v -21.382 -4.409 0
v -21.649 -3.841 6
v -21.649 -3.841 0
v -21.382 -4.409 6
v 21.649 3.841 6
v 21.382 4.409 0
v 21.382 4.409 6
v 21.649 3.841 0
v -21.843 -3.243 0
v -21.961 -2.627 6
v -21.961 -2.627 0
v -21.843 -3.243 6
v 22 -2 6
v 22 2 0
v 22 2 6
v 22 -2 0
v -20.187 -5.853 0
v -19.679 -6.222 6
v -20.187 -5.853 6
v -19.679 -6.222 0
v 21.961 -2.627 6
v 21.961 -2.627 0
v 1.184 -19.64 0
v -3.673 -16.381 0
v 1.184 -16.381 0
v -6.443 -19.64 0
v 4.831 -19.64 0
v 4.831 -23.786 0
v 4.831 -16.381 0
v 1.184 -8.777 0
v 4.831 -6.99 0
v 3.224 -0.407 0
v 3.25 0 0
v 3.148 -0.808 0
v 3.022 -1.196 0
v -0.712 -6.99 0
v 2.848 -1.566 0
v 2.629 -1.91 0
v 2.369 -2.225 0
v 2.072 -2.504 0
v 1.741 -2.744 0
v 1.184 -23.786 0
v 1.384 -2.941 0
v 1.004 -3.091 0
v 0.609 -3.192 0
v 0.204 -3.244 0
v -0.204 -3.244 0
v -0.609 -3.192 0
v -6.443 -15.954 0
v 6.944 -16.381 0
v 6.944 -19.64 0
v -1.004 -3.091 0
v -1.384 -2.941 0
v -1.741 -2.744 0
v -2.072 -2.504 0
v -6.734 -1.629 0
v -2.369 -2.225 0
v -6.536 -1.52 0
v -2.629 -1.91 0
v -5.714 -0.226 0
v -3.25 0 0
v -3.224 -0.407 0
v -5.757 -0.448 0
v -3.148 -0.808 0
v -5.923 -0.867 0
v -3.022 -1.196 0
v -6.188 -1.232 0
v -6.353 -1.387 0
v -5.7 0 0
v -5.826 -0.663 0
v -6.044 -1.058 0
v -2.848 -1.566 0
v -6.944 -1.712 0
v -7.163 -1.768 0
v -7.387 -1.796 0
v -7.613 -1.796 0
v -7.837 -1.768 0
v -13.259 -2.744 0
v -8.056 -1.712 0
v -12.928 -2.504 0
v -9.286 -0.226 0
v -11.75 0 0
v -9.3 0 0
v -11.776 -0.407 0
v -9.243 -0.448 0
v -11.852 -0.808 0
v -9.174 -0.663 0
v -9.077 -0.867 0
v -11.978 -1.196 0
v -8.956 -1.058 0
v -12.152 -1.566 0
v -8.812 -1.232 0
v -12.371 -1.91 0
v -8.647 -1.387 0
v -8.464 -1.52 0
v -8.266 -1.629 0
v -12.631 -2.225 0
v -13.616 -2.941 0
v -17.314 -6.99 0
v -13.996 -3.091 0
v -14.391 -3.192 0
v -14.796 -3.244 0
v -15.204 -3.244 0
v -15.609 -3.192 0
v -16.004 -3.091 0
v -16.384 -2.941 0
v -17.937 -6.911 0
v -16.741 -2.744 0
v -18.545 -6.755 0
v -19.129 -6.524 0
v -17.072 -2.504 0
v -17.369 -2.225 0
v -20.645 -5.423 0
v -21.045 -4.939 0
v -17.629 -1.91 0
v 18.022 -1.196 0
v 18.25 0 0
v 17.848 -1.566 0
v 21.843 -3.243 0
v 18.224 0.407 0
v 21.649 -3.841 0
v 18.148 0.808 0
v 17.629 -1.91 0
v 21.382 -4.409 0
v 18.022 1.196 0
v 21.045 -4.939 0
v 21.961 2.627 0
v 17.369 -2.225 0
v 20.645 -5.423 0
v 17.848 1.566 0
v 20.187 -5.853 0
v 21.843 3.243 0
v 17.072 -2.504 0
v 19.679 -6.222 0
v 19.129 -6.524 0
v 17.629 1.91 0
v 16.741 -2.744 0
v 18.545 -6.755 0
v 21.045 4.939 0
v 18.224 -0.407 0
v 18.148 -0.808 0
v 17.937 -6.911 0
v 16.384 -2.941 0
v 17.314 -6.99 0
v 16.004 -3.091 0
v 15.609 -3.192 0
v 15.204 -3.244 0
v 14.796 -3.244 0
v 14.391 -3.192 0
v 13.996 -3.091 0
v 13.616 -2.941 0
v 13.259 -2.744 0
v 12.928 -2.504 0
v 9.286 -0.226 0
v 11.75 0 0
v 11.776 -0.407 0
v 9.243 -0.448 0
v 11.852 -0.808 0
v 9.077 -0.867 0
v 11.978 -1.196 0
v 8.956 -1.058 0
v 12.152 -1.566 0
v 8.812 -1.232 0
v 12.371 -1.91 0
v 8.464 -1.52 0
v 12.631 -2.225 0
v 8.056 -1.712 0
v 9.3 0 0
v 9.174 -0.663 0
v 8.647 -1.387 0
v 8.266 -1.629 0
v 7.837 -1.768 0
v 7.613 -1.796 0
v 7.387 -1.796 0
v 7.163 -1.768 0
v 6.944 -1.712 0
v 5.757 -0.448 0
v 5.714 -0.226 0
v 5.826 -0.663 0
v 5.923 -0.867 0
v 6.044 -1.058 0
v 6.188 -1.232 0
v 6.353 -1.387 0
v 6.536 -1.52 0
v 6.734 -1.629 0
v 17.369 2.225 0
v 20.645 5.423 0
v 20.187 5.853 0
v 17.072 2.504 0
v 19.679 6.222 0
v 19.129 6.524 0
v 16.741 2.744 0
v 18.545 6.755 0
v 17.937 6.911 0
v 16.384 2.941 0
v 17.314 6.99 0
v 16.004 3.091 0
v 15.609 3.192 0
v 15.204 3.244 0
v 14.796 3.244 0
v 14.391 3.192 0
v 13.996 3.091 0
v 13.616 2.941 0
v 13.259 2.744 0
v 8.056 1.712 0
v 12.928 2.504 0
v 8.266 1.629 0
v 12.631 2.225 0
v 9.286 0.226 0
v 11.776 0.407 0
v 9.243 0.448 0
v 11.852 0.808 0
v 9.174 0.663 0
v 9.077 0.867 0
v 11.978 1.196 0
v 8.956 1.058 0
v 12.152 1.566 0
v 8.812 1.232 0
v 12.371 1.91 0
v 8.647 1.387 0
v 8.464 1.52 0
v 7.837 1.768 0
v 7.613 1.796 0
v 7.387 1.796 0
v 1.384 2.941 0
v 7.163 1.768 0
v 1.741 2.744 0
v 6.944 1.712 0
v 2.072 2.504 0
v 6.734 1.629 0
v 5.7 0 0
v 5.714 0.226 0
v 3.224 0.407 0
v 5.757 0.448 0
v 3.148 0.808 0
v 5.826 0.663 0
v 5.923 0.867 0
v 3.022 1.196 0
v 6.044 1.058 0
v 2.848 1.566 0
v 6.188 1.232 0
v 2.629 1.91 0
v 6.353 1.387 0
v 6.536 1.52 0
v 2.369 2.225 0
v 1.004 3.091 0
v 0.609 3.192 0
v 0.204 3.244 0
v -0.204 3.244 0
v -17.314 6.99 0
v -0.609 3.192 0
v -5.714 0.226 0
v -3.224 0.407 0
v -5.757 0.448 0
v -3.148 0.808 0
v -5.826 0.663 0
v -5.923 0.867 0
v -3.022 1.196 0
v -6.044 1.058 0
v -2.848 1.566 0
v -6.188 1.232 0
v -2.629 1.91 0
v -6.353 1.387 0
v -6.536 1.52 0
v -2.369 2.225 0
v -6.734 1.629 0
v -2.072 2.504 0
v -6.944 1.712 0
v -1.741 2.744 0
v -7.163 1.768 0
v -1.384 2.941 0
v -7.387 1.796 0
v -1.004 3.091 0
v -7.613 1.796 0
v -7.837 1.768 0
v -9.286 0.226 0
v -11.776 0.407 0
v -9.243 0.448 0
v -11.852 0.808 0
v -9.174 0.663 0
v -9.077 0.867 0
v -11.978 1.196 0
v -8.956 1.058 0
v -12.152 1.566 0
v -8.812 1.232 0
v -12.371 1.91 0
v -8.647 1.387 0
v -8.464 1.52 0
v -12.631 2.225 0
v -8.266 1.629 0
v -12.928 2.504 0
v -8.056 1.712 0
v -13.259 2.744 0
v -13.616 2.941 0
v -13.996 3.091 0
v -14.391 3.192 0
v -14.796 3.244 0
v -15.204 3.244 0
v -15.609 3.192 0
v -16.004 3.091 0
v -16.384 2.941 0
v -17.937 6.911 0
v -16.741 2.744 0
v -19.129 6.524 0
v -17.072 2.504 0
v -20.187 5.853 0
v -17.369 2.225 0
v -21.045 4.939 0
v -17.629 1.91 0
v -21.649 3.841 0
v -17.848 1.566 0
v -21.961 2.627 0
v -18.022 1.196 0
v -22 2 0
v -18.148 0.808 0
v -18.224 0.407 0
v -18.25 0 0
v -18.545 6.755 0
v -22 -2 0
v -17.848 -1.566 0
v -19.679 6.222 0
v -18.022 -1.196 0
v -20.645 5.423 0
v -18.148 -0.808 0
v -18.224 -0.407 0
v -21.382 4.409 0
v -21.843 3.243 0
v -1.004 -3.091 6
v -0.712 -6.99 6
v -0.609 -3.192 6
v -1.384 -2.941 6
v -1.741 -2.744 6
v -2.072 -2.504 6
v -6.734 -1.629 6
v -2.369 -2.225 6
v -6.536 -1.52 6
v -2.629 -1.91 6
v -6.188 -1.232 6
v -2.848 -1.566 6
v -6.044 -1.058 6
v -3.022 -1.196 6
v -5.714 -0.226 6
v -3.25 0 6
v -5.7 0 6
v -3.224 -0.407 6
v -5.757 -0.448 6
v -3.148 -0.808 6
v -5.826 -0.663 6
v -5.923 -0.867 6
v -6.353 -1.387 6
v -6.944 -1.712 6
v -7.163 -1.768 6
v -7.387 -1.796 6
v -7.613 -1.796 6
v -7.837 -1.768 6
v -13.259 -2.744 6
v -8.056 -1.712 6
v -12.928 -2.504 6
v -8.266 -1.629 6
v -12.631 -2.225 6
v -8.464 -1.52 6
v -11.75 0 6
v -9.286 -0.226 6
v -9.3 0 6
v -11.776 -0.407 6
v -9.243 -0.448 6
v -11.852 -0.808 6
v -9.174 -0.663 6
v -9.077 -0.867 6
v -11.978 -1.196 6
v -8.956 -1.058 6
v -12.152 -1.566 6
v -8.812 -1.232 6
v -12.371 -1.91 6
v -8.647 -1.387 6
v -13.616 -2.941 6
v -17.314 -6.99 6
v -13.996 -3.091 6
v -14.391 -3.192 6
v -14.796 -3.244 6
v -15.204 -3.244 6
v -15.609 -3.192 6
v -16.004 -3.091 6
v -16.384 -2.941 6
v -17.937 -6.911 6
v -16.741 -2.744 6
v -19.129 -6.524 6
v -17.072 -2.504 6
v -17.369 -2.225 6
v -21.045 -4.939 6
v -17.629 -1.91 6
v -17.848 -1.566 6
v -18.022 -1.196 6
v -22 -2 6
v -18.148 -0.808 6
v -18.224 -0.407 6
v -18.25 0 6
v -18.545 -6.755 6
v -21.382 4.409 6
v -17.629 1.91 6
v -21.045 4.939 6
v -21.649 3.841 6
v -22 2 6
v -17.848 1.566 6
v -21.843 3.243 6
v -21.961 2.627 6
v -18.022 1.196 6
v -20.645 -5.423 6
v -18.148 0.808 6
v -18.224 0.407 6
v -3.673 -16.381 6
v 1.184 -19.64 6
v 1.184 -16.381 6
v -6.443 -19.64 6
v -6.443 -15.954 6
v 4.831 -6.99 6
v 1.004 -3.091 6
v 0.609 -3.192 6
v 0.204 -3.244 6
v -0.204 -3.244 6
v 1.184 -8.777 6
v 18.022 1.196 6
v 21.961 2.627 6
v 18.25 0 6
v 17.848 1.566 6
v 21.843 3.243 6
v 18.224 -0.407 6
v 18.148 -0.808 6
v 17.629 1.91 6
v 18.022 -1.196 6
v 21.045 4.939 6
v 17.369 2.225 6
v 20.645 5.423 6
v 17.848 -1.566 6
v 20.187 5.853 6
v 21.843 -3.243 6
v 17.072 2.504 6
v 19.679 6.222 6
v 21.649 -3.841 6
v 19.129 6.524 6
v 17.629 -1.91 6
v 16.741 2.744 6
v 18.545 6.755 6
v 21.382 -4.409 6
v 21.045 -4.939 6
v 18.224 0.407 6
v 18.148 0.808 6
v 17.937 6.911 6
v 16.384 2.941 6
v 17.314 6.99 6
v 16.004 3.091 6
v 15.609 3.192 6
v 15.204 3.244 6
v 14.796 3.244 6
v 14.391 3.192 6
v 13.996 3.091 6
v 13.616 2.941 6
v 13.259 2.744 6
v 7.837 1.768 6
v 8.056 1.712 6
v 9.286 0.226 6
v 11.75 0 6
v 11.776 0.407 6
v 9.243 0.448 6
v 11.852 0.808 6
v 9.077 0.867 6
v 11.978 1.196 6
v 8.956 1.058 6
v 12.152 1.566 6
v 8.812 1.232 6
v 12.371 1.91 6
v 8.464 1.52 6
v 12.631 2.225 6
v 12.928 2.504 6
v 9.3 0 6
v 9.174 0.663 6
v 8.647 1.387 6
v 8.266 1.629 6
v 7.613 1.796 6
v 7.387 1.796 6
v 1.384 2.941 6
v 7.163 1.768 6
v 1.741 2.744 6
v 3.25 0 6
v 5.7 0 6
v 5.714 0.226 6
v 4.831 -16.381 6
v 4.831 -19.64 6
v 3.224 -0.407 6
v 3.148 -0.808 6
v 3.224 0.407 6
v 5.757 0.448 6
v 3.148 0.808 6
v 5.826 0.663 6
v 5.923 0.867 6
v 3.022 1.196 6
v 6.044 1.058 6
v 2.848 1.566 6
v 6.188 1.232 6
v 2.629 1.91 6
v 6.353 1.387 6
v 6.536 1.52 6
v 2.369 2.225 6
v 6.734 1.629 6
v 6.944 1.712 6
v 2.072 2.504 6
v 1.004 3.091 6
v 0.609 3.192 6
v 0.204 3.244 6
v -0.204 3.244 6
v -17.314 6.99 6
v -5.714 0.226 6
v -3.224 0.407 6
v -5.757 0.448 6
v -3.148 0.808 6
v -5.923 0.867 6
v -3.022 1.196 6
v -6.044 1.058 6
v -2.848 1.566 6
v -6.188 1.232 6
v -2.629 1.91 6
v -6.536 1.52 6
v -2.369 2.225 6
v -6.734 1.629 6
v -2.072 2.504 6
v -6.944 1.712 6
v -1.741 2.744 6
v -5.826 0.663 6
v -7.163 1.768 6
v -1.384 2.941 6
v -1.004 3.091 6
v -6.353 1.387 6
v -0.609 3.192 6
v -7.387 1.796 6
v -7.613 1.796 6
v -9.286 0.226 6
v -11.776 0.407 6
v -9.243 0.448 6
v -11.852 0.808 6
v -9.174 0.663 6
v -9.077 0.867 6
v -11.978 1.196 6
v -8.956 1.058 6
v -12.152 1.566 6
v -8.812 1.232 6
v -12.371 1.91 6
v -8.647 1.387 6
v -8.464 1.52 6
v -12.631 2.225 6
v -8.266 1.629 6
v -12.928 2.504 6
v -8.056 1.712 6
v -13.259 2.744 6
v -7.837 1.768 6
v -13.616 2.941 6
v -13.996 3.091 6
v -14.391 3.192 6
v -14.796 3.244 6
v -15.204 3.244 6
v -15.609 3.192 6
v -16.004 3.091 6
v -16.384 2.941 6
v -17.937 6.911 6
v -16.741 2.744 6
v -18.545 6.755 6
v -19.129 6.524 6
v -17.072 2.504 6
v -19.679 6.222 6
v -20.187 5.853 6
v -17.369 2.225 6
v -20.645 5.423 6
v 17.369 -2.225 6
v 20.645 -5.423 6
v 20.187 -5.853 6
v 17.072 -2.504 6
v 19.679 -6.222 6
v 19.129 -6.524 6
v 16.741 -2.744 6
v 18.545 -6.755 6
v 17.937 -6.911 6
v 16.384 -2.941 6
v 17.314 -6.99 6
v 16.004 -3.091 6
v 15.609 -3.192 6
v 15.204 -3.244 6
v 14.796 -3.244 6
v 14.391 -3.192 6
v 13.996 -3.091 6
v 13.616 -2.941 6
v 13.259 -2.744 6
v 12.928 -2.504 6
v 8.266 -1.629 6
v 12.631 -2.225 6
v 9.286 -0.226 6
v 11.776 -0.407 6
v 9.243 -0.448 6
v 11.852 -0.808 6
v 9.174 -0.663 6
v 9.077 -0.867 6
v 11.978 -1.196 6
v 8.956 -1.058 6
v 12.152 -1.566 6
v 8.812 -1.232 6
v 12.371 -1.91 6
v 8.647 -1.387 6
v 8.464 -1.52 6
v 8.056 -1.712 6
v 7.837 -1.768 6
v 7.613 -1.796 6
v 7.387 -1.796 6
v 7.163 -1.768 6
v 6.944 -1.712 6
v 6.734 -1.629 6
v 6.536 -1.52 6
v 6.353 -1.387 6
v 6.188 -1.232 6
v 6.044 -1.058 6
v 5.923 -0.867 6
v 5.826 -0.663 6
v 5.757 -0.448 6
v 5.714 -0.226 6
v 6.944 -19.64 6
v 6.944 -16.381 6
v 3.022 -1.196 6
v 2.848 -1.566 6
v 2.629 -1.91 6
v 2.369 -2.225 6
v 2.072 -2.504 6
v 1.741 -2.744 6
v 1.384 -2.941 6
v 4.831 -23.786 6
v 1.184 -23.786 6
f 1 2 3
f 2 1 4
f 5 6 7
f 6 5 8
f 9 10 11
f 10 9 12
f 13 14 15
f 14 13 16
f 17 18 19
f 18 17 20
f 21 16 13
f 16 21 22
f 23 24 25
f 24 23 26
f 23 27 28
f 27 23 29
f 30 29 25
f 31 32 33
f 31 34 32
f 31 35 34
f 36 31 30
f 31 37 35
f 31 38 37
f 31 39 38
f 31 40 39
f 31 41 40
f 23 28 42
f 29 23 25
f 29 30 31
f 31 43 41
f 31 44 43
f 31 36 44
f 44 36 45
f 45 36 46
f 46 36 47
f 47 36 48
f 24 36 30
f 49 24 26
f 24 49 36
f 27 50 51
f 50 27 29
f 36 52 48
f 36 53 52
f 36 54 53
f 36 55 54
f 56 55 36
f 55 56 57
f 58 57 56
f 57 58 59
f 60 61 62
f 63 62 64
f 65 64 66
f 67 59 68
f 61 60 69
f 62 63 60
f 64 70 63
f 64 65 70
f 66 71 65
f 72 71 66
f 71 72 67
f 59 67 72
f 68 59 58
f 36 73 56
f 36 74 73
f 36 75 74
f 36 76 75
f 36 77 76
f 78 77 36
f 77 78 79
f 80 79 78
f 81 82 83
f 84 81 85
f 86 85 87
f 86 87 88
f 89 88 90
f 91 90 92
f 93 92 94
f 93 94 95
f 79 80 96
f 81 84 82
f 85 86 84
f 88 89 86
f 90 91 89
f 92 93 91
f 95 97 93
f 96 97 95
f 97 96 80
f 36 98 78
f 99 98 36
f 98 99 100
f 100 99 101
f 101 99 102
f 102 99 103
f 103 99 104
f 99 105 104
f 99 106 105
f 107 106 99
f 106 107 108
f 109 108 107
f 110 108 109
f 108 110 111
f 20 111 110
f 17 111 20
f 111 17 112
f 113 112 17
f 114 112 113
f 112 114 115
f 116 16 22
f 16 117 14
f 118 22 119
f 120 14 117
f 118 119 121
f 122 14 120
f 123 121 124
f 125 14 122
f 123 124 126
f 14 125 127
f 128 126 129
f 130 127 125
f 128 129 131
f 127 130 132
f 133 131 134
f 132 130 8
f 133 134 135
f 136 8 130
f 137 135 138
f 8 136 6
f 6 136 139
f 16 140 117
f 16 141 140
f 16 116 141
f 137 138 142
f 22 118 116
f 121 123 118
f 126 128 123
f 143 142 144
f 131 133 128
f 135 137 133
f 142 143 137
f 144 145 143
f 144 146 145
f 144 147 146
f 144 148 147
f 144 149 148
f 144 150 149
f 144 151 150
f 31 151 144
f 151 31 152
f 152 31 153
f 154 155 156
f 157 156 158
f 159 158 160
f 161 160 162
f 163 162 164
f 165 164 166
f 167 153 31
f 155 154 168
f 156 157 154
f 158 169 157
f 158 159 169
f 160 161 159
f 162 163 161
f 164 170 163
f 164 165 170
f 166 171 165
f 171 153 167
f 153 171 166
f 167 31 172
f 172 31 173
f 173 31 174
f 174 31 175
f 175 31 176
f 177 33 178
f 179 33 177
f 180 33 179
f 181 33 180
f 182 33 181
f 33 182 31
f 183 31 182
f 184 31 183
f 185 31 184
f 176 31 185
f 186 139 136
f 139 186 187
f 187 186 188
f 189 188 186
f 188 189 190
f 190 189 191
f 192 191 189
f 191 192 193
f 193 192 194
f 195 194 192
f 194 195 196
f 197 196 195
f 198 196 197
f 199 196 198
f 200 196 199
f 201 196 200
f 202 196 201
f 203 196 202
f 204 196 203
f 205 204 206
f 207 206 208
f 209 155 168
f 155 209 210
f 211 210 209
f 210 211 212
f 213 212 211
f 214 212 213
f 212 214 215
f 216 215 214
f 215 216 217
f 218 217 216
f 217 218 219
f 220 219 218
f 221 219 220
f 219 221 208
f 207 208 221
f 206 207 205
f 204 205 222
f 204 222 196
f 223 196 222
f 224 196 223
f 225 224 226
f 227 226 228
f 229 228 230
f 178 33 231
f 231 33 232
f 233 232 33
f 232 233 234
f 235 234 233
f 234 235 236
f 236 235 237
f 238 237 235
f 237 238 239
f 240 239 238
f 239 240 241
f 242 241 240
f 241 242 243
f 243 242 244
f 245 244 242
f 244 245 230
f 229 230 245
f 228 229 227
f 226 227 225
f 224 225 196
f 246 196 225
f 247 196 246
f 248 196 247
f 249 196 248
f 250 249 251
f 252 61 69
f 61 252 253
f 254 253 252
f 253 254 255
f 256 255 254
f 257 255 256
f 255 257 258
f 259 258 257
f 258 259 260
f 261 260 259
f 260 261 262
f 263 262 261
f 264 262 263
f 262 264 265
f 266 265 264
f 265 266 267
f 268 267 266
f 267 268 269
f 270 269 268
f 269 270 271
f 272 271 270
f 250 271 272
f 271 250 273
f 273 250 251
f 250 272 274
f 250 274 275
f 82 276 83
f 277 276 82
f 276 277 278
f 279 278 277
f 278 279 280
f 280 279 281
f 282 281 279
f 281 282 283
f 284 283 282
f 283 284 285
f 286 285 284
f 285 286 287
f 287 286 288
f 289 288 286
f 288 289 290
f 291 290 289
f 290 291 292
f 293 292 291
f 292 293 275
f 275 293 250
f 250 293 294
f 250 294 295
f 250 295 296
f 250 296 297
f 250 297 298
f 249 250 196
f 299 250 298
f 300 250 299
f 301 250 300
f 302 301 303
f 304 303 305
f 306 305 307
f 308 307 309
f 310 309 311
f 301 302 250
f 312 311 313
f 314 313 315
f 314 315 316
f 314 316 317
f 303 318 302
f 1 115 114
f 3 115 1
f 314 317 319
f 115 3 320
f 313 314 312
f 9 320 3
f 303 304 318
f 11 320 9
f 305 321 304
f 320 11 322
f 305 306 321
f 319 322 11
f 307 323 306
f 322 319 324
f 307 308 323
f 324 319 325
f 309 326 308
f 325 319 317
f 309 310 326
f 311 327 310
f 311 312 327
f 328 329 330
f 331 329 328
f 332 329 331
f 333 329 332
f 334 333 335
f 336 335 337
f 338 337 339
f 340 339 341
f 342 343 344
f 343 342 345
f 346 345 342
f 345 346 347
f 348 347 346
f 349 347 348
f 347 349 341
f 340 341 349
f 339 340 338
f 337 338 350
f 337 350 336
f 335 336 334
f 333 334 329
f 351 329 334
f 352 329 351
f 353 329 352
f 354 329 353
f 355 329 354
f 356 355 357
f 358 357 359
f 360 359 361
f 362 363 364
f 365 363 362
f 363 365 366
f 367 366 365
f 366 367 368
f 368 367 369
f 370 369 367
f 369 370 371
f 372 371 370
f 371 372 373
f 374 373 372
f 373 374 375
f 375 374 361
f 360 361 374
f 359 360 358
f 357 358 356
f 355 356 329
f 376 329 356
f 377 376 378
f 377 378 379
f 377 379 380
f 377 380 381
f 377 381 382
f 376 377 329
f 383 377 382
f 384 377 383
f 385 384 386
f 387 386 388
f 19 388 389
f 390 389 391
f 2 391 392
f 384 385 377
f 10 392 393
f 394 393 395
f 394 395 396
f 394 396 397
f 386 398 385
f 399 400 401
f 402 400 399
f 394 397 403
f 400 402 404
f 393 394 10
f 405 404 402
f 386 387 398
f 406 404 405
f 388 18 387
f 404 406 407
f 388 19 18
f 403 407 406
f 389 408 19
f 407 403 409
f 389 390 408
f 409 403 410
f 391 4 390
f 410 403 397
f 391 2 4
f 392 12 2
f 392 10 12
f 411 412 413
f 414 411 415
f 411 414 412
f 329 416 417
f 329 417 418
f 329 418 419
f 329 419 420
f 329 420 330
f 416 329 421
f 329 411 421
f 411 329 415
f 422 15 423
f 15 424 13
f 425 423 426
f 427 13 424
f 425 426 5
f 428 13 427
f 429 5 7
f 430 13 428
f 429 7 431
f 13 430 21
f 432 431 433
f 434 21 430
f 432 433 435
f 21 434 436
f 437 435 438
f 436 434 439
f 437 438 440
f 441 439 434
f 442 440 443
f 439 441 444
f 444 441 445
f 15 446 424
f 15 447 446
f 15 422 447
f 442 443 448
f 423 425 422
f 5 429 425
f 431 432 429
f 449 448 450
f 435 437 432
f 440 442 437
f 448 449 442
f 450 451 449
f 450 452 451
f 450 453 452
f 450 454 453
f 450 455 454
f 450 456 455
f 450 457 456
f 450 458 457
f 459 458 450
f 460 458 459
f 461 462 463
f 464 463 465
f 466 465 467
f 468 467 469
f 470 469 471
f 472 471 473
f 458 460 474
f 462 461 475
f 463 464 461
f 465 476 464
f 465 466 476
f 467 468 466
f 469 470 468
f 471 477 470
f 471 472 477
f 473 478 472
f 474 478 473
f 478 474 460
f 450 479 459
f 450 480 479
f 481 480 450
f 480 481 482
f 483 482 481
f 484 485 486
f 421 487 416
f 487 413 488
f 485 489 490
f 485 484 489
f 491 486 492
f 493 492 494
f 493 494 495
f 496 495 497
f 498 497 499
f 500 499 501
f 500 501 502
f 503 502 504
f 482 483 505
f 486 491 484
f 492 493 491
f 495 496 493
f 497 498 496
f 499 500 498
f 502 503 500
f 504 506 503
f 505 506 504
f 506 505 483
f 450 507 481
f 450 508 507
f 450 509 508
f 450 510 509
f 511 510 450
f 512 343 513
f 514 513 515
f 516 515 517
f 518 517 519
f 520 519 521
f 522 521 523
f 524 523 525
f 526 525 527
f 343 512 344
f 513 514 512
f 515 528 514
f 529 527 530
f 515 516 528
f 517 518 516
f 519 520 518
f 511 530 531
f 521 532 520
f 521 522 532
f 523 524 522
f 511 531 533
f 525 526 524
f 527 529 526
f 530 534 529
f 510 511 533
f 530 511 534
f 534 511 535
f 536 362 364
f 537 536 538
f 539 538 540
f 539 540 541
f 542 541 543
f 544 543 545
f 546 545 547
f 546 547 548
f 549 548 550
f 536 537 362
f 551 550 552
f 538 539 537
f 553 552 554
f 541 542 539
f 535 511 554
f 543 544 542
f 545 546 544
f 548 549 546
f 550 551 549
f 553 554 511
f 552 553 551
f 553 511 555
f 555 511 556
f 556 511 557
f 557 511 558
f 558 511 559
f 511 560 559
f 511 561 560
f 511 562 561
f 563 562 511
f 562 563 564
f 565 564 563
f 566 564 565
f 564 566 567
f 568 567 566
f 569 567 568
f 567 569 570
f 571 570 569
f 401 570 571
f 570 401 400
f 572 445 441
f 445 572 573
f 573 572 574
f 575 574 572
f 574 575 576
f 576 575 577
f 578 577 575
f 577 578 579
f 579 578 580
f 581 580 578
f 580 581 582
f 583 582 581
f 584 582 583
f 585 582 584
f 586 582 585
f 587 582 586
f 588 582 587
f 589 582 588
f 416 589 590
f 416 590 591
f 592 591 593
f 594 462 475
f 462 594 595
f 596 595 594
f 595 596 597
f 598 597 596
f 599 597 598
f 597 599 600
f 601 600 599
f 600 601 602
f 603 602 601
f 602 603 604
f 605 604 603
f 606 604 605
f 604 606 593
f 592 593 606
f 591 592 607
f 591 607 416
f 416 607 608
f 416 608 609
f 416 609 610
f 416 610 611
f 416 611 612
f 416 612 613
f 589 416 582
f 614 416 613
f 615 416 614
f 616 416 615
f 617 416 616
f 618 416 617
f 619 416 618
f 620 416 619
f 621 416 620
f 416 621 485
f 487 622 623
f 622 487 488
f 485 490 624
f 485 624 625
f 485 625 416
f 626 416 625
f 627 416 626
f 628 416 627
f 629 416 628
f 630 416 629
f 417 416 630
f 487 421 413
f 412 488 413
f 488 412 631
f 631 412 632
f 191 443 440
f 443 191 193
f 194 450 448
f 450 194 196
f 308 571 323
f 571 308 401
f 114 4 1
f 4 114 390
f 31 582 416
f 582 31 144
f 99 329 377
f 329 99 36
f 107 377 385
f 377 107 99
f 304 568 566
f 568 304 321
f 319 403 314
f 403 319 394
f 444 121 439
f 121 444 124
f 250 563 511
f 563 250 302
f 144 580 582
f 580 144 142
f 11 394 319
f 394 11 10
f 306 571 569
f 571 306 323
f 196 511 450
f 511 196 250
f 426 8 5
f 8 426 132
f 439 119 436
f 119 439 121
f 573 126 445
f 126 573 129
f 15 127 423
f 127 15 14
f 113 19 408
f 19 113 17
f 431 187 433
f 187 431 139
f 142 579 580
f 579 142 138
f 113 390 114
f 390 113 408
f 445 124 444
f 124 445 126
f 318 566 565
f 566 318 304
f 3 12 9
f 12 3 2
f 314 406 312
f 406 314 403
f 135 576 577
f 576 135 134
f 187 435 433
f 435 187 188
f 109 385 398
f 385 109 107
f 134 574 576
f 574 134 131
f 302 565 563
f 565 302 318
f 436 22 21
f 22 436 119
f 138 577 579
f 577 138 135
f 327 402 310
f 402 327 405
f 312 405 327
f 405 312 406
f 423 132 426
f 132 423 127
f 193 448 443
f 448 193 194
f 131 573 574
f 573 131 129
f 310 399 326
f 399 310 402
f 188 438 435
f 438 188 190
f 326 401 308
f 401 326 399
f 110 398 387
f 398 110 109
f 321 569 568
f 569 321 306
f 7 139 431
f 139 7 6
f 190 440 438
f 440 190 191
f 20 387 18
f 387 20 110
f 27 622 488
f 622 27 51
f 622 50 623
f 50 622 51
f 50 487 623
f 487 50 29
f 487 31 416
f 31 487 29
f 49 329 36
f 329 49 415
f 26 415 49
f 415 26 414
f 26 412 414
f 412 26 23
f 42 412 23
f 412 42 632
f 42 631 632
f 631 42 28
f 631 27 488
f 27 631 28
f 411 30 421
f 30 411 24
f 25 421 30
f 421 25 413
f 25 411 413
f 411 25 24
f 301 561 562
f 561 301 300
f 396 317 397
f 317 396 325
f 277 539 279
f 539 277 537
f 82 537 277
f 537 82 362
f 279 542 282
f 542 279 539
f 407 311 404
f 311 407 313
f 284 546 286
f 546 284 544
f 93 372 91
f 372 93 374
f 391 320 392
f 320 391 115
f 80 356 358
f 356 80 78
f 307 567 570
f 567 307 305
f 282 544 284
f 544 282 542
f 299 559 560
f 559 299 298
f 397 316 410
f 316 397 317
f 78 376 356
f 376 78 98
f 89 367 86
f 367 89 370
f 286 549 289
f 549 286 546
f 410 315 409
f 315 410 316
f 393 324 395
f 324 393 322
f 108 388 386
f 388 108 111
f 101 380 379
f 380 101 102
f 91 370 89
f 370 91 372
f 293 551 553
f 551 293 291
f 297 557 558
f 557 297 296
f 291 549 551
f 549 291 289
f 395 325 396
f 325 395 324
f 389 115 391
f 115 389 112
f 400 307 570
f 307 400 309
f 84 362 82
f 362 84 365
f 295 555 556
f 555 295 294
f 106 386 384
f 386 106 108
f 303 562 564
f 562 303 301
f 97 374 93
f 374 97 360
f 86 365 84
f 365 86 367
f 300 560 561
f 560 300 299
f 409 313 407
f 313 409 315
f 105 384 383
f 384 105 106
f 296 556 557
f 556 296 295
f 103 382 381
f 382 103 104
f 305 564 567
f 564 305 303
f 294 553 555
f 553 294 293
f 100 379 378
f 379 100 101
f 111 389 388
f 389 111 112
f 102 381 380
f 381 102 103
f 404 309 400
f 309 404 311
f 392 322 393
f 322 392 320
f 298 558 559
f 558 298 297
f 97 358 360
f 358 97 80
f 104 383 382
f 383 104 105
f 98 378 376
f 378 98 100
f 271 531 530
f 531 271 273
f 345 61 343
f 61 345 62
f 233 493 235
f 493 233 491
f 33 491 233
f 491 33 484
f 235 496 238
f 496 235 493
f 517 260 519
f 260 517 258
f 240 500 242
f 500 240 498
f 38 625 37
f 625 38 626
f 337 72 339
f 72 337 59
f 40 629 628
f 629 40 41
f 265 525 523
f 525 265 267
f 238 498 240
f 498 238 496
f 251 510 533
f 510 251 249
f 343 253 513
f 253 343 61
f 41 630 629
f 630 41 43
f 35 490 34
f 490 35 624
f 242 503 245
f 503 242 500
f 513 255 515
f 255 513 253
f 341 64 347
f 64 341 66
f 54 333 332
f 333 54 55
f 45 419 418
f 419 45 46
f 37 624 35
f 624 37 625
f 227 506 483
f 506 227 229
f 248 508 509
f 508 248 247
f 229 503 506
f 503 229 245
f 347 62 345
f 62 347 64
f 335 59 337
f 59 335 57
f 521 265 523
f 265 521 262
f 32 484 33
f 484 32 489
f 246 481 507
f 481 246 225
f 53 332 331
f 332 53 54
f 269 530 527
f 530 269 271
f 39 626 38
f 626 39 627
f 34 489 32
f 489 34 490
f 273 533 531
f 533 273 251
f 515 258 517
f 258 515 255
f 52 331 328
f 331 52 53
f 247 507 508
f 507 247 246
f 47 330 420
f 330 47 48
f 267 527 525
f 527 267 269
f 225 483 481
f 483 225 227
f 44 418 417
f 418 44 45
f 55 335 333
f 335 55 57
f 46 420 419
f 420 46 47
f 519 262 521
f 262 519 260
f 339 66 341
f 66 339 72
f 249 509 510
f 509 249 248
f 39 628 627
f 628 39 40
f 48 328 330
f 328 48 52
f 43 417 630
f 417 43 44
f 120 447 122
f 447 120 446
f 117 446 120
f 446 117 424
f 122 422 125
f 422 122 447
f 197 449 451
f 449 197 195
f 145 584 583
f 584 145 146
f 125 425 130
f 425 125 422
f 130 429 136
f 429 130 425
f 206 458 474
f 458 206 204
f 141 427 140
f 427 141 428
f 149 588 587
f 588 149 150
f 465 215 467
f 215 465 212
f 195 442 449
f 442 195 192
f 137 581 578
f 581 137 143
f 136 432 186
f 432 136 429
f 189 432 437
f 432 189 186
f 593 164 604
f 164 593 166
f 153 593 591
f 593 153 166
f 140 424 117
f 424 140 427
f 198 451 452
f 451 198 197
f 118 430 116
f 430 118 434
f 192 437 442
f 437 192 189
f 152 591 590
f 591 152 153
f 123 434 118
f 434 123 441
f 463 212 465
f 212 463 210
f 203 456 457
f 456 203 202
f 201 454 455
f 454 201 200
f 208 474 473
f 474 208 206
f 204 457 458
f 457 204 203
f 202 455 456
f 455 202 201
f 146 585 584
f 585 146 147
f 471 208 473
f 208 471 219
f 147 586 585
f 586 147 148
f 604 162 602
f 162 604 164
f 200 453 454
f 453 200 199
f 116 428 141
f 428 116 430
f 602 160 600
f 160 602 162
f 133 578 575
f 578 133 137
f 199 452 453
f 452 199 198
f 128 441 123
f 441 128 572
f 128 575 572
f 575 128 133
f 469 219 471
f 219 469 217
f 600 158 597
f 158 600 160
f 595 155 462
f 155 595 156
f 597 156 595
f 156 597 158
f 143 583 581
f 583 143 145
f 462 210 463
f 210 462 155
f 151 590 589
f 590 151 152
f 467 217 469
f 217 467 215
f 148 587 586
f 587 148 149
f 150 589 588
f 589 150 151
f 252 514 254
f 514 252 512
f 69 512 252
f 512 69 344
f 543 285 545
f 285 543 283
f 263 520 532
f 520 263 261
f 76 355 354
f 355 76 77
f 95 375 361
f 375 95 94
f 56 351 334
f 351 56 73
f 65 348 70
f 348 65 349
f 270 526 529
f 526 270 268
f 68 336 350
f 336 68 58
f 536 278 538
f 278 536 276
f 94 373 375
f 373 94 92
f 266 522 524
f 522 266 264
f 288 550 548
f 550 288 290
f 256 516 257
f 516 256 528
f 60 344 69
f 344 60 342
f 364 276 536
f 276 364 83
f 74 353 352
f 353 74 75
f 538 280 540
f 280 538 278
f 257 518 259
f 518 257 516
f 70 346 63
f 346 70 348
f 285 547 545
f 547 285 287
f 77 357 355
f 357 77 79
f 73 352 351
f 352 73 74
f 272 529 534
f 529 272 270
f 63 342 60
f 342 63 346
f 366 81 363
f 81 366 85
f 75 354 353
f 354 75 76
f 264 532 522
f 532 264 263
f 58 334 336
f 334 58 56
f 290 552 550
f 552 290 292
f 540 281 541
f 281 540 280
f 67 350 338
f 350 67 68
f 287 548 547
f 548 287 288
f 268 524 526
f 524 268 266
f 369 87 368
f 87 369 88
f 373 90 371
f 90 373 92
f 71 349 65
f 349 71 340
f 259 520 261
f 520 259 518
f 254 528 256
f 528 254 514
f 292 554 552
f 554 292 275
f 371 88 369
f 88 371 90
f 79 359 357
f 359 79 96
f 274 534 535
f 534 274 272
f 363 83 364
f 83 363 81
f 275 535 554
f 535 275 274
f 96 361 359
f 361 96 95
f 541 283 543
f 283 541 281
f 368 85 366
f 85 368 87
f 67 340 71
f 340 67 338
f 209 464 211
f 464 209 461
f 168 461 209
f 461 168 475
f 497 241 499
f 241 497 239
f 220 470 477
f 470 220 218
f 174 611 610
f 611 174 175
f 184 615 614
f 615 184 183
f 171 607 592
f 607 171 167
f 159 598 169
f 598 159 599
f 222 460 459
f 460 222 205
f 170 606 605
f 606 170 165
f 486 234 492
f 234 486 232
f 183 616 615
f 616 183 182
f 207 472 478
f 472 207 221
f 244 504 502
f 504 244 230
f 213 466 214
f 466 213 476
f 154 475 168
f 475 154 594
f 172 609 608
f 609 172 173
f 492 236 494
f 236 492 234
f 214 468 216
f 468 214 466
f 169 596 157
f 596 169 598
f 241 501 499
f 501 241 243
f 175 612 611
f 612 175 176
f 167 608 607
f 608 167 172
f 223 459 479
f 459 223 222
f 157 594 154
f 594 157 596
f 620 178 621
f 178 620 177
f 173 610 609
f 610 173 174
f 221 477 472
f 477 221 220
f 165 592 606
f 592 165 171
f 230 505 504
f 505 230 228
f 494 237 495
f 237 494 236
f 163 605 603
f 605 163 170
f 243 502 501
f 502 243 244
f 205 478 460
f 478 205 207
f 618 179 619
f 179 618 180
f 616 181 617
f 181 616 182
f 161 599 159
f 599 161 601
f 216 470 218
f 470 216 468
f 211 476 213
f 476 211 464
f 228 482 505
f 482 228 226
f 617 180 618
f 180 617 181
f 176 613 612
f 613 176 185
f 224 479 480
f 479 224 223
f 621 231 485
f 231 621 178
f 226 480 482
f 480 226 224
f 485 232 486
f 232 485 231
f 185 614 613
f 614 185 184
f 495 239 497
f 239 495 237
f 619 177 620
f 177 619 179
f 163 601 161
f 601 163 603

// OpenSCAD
$fn = 50;


difference() {
	union() {
		hull() {
			translate(v = [-17.0000000000, 2.0000000000, 0]) {
				cylinder(h = 6, r = 5);
			}
			translate(v = [17.0000000000, 2.0000000000, 0]) {
				cylinder(h = 6, r = 5);
			}
			translate(v = [-17.0000000000, -2.0000000000, 0]) {
				cylinder(h = 6, r = 5);
			}
			translate(v = [17.0000000000, -2.0000000000, 0]) {
				cylinder(h = 6, r = 5);
			}
		}
		translate(v = [0, -5, 0]) {
			linear_extrude(height = 6) {
				text(font = "DejaVu Sans Mono:style=Bold", halign = "center", size = 19.0000000000, text = "4", valign = "top");
			}
		}
	}
	union() {
		translate(v = [-15.0000000000, 0.0000000000, 0]) {
			translate(v = [0, 0, -100]) {
				cylinder(h = 200, r = 3.2500000000);
			}
		}
		translate(v = [0, 0, -100]) {
			cylinder(h = 200, r = 3.2500000000);
		}
		translate(v = [15.0000000000, 0.0000000000, 0]) {
			translate(v = [0, 0, -100]) {
				cylinder(h = 200, r = 3.2500000000);
			}
		}
		translate(v = [-15.0000000000, 0.0000000000, 0]) {
			translate(v = [0, 0, -100]) {
				cylinder(h = 200, r = 1.8000000000);
			}
		}
		translate(v = [-7.5000000000, 0.0000000000, 0]) {
			translate(v = [0, 0, -100]) {
				cylinder(h = 200, r = 1.8000000000);
			}
		}
		translate(v = [0, 0, -100]) {
			cylinder(h = 200, r = 1.8000000000);
		}
		translate(v = [7.5000000000, 0.0000000000, 0]) {
			translate(v = [0, 0, -100]) {
				cylinder(h = 200, r = 1.8000000000);
			}
		}
		translate(v = [15.0000000000, 0.0000000000, 0]) {
			translate(v = [0, 0, -100]) {
				cylinder(h = 200, r = 1.8000000000);
			}
		}
	}
}
